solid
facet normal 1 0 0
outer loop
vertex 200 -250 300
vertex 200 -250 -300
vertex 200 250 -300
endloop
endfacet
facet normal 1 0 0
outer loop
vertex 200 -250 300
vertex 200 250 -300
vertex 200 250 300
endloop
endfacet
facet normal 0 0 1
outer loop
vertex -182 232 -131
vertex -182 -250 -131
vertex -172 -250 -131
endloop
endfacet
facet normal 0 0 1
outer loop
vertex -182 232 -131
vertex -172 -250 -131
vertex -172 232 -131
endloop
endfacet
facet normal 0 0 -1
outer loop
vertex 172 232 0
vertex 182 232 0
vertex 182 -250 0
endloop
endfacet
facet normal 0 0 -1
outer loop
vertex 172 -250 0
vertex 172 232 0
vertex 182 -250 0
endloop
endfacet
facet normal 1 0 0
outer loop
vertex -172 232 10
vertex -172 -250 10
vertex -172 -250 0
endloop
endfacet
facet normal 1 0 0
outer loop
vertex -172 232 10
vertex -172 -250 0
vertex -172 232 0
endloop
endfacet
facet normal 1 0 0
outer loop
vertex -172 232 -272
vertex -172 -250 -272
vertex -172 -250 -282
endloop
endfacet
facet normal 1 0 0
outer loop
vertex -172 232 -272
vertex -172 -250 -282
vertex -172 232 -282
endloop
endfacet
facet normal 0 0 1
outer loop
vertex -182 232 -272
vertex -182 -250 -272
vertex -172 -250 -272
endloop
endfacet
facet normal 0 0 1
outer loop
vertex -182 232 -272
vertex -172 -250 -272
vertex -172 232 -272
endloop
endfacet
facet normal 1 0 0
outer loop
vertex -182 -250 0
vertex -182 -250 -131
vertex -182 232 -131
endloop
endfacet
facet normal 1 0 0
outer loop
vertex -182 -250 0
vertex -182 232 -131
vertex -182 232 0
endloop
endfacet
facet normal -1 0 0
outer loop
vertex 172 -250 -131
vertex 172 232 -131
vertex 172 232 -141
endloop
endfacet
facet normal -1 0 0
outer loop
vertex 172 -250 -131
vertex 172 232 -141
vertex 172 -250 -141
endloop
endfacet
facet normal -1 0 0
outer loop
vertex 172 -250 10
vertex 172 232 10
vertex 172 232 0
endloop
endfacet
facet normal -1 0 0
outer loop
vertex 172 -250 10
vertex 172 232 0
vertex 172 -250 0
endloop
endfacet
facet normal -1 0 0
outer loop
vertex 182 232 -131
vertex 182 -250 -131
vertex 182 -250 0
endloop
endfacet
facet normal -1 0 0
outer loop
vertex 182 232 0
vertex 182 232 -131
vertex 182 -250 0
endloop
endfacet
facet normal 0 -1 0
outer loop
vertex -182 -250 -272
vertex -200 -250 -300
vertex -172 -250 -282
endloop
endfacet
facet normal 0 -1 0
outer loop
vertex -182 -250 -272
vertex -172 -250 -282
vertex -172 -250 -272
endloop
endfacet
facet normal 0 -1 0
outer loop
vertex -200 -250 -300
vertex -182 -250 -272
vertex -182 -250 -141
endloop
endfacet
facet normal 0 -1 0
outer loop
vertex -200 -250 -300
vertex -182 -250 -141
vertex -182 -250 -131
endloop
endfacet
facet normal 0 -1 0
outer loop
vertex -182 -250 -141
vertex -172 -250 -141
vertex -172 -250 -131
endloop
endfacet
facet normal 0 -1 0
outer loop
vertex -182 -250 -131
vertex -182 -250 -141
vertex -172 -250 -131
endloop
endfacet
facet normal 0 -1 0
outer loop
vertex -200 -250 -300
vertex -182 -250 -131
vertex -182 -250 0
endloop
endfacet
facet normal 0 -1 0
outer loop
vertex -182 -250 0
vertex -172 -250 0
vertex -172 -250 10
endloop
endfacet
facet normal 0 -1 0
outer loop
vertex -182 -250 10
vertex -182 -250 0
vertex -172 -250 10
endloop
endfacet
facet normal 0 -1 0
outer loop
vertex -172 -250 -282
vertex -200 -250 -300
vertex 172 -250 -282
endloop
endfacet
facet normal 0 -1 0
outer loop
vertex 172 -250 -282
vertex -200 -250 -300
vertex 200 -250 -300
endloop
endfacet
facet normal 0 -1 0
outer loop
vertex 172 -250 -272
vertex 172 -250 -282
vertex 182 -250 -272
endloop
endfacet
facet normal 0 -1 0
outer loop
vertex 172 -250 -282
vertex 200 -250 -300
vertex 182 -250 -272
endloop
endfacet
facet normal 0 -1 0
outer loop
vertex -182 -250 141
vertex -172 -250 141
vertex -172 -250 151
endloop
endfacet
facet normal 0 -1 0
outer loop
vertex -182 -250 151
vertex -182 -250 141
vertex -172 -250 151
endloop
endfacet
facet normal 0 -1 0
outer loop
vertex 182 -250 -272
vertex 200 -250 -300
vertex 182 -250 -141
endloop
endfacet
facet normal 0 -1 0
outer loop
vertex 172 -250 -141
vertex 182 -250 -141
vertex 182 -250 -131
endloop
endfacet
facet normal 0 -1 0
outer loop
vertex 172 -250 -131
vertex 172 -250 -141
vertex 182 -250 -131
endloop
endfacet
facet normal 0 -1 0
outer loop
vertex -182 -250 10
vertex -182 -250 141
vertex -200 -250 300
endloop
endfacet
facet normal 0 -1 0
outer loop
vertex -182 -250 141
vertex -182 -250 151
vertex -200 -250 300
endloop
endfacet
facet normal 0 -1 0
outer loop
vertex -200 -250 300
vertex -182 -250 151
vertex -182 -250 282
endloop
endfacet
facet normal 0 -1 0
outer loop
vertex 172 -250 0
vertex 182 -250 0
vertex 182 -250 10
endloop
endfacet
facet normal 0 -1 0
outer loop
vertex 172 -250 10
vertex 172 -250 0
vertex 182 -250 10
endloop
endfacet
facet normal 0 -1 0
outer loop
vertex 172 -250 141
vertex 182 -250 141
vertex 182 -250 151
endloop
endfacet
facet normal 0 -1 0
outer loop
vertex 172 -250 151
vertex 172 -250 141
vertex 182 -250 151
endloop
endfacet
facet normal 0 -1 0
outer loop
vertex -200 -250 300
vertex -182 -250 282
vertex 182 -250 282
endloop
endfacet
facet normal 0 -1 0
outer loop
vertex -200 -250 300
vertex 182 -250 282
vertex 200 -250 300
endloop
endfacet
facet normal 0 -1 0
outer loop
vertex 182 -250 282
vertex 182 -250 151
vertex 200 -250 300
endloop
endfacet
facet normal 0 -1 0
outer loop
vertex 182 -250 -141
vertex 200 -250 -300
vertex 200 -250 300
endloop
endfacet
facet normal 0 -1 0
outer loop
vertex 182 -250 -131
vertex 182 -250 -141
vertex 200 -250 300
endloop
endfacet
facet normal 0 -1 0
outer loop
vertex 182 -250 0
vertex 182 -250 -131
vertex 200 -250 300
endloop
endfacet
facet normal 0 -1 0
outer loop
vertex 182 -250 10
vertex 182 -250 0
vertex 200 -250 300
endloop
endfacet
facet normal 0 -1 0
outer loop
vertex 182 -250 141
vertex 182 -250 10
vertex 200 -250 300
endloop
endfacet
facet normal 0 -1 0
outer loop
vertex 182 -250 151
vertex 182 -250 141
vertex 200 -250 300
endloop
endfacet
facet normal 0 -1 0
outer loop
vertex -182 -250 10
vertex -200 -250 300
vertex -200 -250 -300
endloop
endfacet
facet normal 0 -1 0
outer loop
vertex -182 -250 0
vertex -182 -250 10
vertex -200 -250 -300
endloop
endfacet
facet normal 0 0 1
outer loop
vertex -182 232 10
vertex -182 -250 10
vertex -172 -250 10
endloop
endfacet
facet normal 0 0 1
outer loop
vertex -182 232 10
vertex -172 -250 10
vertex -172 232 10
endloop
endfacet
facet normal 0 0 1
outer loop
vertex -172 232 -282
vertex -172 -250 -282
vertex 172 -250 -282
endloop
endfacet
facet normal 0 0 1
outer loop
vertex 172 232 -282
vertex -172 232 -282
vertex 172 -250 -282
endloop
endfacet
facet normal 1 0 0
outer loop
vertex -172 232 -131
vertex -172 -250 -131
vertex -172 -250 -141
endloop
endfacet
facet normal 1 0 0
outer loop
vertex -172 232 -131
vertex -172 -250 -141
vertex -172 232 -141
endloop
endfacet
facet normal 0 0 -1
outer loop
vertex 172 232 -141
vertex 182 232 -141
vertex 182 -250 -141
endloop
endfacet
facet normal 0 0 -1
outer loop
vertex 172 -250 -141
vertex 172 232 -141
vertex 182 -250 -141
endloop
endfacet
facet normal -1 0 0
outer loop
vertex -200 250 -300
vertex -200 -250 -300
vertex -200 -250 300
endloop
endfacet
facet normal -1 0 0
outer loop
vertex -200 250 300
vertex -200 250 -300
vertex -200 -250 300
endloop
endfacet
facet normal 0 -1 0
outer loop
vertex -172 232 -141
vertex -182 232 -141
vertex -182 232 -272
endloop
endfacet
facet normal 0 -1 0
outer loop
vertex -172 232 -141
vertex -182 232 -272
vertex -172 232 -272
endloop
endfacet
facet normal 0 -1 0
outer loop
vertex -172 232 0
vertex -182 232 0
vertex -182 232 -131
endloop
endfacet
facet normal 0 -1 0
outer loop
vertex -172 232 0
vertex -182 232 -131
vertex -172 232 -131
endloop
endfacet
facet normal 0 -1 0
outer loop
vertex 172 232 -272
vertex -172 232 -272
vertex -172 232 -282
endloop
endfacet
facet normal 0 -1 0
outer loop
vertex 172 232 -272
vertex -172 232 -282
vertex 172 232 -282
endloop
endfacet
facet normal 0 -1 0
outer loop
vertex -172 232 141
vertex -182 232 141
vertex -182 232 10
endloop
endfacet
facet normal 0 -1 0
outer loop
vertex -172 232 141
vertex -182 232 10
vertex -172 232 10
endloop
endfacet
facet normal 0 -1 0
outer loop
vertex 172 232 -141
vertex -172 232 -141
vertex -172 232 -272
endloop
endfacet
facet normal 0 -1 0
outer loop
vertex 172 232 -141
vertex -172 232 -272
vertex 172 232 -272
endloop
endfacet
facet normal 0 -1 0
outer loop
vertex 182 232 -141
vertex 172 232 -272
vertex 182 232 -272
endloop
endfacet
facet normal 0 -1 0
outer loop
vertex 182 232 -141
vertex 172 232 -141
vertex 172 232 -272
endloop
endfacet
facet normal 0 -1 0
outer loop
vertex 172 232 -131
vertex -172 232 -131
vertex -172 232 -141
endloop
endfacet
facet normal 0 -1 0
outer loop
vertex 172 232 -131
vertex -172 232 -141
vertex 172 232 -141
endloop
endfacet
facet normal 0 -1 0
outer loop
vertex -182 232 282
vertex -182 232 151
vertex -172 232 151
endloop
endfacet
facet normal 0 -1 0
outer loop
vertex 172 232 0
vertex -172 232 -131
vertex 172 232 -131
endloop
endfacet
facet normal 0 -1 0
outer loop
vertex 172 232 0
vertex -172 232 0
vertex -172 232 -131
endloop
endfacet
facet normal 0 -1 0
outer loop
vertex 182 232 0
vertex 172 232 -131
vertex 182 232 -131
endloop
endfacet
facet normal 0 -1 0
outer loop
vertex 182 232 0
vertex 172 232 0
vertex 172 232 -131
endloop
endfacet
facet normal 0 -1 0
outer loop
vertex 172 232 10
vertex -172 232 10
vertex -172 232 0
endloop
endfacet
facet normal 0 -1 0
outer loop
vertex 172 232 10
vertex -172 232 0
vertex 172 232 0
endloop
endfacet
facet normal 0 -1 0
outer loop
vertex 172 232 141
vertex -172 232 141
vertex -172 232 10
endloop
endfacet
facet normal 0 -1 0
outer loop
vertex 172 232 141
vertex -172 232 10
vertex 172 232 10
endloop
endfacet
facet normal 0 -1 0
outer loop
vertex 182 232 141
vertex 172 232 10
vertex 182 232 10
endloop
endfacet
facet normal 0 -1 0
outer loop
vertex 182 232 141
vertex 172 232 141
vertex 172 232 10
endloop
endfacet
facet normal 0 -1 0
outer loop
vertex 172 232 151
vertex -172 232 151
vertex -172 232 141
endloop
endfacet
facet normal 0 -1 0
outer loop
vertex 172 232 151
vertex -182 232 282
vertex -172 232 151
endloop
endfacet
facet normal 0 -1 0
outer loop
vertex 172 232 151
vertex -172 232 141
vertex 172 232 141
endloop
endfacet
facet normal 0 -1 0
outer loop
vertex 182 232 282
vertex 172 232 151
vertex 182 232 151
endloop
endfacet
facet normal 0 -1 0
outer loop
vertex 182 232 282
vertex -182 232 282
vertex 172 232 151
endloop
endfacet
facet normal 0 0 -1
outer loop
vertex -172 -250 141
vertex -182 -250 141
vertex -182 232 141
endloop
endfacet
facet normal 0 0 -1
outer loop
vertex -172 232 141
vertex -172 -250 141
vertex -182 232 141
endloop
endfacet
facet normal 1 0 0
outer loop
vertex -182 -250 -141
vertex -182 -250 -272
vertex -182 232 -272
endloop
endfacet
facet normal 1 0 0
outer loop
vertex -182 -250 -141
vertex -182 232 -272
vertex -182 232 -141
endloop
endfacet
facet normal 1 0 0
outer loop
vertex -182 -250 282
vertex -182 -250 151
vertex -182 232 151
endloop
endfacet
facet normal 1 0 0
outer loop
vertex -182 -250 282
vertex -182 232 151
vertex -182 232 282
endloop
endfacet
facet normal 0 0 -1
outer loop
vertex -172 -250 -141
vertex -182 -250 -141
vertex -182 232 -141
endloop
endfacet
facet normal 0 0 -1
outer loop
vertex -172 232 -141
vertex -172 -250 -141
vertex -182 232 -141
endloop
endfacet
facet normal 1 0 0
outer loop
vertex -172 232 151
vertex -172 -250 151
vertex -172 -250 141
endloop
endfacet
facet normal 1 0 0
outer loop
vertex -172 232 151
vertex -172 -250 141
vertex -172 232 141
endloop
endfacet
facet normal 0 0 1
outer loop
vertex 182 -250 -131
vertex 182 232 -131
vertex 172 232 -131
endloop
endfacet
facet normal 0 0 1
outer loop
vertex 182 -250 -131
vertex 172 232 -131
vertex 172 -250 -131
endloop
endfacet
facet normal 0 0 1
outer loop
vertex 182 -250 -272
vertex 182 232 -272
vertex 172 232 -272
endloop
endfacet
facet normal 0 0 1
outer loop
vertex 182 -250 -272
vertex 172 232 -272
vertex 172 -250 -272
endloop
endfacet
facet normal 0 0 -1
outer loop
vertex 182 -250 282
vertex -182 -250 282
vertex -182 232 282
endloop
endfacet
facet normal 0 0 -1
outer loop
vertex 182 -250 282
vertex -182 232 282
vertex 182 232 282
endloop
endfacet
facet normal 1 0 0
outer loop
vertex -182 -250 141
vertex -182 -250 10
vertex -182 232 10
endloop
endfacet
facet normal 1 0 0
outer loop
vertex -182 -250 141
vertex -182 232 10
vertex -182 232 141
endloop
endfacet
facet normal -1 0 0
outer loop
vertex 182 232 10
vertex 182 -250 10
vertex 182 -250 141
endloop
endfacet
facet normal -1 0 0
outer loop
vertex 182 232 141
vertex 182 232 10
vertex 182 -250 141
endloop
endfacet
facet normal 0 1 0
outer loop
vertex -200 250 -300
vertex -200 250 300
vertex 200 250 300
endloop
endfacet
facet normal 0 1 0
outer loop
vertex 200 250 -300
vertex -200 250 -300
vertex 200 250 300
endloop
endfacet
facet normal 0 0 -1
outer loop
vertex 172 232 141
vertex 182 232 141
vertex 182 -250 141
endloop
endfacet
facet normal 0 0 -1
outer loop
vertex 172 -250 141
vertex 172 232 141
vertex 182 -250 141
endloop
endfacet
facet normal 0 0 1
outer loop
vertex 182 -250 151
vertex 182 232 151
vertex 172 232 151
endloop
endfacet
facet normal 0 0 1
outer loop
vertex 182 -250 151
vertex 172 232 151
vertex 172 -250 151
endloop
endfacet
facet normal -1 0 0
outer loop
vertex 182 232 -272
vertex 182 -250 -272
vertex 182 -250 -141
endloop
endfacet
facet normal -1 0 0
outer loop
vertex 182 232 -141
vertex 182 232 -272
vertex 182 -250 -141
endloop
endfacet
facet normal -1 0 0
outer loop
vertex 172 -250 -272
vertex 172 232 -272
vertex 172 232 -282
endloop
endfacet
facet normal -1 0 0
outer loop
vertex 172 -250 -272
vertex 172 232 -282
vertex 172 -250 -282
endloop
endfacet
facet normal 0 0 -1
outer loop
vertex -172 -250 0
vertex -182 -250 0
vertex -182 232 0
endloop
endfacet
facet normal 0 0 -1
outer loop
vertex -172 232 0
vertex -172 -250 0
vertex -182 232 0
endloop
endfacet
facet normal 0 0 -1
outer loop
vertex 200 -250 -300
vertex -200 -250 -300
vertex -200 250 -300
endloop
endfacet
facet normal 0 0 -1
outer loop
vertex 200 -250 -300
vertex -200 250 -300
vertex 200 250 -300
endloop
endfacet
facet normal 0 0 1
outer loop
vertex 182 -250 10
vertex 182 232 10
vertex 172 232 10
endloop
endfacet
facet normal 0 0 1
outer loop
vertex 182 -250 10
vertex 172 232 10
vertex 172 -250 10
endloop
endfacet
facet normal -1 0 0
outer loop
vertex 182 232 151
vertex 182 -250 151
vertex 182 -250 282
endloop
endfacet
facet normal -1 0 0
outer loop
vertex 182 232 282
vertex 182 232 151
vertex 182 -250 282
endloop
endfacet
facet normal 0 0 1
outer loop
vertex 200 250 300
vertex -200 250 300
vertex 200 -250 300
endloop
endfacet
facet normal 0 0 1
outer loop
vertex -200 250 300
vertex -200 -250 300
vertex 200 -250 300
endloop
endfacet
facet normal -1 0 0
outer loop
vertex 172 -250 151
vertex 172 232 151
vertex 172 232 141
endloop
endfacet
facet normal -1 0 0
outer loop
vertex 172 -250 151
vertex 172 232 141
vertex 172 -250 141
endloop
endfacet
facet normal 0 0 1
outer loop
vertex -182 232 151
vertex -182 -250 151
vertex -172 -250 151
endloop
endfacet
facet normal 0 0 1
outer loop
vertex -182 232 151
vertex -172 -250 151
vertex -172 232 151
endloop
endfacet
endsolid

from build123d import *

# Parameters (mm, degrees)
F0_W     = 400
F0_H     = 600
F1_DEPTH = 250
F2_W     = 364
F2_H     = 564
F3_DEPTH = 482
F4_W     = 482
F4_H     = 10
F5_DEPTH = 10
F6_W     = 482
F6_H     = 10
F7_DEPTH = 10


with BuildPart() as f1:
    # F0 (on Front) → F1 (new body, symmetric)
    with BuildSketch(Plane.XZ):
        Rectangle(F0_W, F0_H)
    extrude(amount=F1_DEPTH, both=True)

    # F2 (on face) → F3 (cut)
    with BuildSketch(Plane.XZ.offset(250)):
        Rectangle(F2_W, F2_H)
    extrude(amount=-F3_DEPTH, mode=Mode.SUBTRACT)

    # F4 (on face) → F5 (join)
    with BuildSketch(Plane.YZ.offset(-182)):
        with Locations((-9, 146)):
            Rectangle(F4_W, F4_H)
        with Locations((-9, 5)):
            Rectangle(F4_W, F4_H)
        with Locations((-9, -136)):
            Rectangle(F4_W, F4_H)
        with Locations((-9, -277)):
            Rectangle(F4_W, F4_H)
    extrude(amount=F5_DEPTH)

    # F6 (on face) → F7 (join)
    with BuildSketch(Plane(origin=(182, 0, 0), x_dir=(0, -1, 0), z_dir=(-1, 0, 0))):
        with Locations((9, 146)):
            Rectangle(F6_W, F6_H)
        with Locations((9, 5)):
            Rectangle(F6_W, F6_H)
        with Locations((9, -136)):
            Rectangle(F6_W, F6_H)
        with Locations((9, -277)):
            Rectangle(F6_W, F6_H)
    extrude(amount=F7_DEPTH)


solid = f1.part
